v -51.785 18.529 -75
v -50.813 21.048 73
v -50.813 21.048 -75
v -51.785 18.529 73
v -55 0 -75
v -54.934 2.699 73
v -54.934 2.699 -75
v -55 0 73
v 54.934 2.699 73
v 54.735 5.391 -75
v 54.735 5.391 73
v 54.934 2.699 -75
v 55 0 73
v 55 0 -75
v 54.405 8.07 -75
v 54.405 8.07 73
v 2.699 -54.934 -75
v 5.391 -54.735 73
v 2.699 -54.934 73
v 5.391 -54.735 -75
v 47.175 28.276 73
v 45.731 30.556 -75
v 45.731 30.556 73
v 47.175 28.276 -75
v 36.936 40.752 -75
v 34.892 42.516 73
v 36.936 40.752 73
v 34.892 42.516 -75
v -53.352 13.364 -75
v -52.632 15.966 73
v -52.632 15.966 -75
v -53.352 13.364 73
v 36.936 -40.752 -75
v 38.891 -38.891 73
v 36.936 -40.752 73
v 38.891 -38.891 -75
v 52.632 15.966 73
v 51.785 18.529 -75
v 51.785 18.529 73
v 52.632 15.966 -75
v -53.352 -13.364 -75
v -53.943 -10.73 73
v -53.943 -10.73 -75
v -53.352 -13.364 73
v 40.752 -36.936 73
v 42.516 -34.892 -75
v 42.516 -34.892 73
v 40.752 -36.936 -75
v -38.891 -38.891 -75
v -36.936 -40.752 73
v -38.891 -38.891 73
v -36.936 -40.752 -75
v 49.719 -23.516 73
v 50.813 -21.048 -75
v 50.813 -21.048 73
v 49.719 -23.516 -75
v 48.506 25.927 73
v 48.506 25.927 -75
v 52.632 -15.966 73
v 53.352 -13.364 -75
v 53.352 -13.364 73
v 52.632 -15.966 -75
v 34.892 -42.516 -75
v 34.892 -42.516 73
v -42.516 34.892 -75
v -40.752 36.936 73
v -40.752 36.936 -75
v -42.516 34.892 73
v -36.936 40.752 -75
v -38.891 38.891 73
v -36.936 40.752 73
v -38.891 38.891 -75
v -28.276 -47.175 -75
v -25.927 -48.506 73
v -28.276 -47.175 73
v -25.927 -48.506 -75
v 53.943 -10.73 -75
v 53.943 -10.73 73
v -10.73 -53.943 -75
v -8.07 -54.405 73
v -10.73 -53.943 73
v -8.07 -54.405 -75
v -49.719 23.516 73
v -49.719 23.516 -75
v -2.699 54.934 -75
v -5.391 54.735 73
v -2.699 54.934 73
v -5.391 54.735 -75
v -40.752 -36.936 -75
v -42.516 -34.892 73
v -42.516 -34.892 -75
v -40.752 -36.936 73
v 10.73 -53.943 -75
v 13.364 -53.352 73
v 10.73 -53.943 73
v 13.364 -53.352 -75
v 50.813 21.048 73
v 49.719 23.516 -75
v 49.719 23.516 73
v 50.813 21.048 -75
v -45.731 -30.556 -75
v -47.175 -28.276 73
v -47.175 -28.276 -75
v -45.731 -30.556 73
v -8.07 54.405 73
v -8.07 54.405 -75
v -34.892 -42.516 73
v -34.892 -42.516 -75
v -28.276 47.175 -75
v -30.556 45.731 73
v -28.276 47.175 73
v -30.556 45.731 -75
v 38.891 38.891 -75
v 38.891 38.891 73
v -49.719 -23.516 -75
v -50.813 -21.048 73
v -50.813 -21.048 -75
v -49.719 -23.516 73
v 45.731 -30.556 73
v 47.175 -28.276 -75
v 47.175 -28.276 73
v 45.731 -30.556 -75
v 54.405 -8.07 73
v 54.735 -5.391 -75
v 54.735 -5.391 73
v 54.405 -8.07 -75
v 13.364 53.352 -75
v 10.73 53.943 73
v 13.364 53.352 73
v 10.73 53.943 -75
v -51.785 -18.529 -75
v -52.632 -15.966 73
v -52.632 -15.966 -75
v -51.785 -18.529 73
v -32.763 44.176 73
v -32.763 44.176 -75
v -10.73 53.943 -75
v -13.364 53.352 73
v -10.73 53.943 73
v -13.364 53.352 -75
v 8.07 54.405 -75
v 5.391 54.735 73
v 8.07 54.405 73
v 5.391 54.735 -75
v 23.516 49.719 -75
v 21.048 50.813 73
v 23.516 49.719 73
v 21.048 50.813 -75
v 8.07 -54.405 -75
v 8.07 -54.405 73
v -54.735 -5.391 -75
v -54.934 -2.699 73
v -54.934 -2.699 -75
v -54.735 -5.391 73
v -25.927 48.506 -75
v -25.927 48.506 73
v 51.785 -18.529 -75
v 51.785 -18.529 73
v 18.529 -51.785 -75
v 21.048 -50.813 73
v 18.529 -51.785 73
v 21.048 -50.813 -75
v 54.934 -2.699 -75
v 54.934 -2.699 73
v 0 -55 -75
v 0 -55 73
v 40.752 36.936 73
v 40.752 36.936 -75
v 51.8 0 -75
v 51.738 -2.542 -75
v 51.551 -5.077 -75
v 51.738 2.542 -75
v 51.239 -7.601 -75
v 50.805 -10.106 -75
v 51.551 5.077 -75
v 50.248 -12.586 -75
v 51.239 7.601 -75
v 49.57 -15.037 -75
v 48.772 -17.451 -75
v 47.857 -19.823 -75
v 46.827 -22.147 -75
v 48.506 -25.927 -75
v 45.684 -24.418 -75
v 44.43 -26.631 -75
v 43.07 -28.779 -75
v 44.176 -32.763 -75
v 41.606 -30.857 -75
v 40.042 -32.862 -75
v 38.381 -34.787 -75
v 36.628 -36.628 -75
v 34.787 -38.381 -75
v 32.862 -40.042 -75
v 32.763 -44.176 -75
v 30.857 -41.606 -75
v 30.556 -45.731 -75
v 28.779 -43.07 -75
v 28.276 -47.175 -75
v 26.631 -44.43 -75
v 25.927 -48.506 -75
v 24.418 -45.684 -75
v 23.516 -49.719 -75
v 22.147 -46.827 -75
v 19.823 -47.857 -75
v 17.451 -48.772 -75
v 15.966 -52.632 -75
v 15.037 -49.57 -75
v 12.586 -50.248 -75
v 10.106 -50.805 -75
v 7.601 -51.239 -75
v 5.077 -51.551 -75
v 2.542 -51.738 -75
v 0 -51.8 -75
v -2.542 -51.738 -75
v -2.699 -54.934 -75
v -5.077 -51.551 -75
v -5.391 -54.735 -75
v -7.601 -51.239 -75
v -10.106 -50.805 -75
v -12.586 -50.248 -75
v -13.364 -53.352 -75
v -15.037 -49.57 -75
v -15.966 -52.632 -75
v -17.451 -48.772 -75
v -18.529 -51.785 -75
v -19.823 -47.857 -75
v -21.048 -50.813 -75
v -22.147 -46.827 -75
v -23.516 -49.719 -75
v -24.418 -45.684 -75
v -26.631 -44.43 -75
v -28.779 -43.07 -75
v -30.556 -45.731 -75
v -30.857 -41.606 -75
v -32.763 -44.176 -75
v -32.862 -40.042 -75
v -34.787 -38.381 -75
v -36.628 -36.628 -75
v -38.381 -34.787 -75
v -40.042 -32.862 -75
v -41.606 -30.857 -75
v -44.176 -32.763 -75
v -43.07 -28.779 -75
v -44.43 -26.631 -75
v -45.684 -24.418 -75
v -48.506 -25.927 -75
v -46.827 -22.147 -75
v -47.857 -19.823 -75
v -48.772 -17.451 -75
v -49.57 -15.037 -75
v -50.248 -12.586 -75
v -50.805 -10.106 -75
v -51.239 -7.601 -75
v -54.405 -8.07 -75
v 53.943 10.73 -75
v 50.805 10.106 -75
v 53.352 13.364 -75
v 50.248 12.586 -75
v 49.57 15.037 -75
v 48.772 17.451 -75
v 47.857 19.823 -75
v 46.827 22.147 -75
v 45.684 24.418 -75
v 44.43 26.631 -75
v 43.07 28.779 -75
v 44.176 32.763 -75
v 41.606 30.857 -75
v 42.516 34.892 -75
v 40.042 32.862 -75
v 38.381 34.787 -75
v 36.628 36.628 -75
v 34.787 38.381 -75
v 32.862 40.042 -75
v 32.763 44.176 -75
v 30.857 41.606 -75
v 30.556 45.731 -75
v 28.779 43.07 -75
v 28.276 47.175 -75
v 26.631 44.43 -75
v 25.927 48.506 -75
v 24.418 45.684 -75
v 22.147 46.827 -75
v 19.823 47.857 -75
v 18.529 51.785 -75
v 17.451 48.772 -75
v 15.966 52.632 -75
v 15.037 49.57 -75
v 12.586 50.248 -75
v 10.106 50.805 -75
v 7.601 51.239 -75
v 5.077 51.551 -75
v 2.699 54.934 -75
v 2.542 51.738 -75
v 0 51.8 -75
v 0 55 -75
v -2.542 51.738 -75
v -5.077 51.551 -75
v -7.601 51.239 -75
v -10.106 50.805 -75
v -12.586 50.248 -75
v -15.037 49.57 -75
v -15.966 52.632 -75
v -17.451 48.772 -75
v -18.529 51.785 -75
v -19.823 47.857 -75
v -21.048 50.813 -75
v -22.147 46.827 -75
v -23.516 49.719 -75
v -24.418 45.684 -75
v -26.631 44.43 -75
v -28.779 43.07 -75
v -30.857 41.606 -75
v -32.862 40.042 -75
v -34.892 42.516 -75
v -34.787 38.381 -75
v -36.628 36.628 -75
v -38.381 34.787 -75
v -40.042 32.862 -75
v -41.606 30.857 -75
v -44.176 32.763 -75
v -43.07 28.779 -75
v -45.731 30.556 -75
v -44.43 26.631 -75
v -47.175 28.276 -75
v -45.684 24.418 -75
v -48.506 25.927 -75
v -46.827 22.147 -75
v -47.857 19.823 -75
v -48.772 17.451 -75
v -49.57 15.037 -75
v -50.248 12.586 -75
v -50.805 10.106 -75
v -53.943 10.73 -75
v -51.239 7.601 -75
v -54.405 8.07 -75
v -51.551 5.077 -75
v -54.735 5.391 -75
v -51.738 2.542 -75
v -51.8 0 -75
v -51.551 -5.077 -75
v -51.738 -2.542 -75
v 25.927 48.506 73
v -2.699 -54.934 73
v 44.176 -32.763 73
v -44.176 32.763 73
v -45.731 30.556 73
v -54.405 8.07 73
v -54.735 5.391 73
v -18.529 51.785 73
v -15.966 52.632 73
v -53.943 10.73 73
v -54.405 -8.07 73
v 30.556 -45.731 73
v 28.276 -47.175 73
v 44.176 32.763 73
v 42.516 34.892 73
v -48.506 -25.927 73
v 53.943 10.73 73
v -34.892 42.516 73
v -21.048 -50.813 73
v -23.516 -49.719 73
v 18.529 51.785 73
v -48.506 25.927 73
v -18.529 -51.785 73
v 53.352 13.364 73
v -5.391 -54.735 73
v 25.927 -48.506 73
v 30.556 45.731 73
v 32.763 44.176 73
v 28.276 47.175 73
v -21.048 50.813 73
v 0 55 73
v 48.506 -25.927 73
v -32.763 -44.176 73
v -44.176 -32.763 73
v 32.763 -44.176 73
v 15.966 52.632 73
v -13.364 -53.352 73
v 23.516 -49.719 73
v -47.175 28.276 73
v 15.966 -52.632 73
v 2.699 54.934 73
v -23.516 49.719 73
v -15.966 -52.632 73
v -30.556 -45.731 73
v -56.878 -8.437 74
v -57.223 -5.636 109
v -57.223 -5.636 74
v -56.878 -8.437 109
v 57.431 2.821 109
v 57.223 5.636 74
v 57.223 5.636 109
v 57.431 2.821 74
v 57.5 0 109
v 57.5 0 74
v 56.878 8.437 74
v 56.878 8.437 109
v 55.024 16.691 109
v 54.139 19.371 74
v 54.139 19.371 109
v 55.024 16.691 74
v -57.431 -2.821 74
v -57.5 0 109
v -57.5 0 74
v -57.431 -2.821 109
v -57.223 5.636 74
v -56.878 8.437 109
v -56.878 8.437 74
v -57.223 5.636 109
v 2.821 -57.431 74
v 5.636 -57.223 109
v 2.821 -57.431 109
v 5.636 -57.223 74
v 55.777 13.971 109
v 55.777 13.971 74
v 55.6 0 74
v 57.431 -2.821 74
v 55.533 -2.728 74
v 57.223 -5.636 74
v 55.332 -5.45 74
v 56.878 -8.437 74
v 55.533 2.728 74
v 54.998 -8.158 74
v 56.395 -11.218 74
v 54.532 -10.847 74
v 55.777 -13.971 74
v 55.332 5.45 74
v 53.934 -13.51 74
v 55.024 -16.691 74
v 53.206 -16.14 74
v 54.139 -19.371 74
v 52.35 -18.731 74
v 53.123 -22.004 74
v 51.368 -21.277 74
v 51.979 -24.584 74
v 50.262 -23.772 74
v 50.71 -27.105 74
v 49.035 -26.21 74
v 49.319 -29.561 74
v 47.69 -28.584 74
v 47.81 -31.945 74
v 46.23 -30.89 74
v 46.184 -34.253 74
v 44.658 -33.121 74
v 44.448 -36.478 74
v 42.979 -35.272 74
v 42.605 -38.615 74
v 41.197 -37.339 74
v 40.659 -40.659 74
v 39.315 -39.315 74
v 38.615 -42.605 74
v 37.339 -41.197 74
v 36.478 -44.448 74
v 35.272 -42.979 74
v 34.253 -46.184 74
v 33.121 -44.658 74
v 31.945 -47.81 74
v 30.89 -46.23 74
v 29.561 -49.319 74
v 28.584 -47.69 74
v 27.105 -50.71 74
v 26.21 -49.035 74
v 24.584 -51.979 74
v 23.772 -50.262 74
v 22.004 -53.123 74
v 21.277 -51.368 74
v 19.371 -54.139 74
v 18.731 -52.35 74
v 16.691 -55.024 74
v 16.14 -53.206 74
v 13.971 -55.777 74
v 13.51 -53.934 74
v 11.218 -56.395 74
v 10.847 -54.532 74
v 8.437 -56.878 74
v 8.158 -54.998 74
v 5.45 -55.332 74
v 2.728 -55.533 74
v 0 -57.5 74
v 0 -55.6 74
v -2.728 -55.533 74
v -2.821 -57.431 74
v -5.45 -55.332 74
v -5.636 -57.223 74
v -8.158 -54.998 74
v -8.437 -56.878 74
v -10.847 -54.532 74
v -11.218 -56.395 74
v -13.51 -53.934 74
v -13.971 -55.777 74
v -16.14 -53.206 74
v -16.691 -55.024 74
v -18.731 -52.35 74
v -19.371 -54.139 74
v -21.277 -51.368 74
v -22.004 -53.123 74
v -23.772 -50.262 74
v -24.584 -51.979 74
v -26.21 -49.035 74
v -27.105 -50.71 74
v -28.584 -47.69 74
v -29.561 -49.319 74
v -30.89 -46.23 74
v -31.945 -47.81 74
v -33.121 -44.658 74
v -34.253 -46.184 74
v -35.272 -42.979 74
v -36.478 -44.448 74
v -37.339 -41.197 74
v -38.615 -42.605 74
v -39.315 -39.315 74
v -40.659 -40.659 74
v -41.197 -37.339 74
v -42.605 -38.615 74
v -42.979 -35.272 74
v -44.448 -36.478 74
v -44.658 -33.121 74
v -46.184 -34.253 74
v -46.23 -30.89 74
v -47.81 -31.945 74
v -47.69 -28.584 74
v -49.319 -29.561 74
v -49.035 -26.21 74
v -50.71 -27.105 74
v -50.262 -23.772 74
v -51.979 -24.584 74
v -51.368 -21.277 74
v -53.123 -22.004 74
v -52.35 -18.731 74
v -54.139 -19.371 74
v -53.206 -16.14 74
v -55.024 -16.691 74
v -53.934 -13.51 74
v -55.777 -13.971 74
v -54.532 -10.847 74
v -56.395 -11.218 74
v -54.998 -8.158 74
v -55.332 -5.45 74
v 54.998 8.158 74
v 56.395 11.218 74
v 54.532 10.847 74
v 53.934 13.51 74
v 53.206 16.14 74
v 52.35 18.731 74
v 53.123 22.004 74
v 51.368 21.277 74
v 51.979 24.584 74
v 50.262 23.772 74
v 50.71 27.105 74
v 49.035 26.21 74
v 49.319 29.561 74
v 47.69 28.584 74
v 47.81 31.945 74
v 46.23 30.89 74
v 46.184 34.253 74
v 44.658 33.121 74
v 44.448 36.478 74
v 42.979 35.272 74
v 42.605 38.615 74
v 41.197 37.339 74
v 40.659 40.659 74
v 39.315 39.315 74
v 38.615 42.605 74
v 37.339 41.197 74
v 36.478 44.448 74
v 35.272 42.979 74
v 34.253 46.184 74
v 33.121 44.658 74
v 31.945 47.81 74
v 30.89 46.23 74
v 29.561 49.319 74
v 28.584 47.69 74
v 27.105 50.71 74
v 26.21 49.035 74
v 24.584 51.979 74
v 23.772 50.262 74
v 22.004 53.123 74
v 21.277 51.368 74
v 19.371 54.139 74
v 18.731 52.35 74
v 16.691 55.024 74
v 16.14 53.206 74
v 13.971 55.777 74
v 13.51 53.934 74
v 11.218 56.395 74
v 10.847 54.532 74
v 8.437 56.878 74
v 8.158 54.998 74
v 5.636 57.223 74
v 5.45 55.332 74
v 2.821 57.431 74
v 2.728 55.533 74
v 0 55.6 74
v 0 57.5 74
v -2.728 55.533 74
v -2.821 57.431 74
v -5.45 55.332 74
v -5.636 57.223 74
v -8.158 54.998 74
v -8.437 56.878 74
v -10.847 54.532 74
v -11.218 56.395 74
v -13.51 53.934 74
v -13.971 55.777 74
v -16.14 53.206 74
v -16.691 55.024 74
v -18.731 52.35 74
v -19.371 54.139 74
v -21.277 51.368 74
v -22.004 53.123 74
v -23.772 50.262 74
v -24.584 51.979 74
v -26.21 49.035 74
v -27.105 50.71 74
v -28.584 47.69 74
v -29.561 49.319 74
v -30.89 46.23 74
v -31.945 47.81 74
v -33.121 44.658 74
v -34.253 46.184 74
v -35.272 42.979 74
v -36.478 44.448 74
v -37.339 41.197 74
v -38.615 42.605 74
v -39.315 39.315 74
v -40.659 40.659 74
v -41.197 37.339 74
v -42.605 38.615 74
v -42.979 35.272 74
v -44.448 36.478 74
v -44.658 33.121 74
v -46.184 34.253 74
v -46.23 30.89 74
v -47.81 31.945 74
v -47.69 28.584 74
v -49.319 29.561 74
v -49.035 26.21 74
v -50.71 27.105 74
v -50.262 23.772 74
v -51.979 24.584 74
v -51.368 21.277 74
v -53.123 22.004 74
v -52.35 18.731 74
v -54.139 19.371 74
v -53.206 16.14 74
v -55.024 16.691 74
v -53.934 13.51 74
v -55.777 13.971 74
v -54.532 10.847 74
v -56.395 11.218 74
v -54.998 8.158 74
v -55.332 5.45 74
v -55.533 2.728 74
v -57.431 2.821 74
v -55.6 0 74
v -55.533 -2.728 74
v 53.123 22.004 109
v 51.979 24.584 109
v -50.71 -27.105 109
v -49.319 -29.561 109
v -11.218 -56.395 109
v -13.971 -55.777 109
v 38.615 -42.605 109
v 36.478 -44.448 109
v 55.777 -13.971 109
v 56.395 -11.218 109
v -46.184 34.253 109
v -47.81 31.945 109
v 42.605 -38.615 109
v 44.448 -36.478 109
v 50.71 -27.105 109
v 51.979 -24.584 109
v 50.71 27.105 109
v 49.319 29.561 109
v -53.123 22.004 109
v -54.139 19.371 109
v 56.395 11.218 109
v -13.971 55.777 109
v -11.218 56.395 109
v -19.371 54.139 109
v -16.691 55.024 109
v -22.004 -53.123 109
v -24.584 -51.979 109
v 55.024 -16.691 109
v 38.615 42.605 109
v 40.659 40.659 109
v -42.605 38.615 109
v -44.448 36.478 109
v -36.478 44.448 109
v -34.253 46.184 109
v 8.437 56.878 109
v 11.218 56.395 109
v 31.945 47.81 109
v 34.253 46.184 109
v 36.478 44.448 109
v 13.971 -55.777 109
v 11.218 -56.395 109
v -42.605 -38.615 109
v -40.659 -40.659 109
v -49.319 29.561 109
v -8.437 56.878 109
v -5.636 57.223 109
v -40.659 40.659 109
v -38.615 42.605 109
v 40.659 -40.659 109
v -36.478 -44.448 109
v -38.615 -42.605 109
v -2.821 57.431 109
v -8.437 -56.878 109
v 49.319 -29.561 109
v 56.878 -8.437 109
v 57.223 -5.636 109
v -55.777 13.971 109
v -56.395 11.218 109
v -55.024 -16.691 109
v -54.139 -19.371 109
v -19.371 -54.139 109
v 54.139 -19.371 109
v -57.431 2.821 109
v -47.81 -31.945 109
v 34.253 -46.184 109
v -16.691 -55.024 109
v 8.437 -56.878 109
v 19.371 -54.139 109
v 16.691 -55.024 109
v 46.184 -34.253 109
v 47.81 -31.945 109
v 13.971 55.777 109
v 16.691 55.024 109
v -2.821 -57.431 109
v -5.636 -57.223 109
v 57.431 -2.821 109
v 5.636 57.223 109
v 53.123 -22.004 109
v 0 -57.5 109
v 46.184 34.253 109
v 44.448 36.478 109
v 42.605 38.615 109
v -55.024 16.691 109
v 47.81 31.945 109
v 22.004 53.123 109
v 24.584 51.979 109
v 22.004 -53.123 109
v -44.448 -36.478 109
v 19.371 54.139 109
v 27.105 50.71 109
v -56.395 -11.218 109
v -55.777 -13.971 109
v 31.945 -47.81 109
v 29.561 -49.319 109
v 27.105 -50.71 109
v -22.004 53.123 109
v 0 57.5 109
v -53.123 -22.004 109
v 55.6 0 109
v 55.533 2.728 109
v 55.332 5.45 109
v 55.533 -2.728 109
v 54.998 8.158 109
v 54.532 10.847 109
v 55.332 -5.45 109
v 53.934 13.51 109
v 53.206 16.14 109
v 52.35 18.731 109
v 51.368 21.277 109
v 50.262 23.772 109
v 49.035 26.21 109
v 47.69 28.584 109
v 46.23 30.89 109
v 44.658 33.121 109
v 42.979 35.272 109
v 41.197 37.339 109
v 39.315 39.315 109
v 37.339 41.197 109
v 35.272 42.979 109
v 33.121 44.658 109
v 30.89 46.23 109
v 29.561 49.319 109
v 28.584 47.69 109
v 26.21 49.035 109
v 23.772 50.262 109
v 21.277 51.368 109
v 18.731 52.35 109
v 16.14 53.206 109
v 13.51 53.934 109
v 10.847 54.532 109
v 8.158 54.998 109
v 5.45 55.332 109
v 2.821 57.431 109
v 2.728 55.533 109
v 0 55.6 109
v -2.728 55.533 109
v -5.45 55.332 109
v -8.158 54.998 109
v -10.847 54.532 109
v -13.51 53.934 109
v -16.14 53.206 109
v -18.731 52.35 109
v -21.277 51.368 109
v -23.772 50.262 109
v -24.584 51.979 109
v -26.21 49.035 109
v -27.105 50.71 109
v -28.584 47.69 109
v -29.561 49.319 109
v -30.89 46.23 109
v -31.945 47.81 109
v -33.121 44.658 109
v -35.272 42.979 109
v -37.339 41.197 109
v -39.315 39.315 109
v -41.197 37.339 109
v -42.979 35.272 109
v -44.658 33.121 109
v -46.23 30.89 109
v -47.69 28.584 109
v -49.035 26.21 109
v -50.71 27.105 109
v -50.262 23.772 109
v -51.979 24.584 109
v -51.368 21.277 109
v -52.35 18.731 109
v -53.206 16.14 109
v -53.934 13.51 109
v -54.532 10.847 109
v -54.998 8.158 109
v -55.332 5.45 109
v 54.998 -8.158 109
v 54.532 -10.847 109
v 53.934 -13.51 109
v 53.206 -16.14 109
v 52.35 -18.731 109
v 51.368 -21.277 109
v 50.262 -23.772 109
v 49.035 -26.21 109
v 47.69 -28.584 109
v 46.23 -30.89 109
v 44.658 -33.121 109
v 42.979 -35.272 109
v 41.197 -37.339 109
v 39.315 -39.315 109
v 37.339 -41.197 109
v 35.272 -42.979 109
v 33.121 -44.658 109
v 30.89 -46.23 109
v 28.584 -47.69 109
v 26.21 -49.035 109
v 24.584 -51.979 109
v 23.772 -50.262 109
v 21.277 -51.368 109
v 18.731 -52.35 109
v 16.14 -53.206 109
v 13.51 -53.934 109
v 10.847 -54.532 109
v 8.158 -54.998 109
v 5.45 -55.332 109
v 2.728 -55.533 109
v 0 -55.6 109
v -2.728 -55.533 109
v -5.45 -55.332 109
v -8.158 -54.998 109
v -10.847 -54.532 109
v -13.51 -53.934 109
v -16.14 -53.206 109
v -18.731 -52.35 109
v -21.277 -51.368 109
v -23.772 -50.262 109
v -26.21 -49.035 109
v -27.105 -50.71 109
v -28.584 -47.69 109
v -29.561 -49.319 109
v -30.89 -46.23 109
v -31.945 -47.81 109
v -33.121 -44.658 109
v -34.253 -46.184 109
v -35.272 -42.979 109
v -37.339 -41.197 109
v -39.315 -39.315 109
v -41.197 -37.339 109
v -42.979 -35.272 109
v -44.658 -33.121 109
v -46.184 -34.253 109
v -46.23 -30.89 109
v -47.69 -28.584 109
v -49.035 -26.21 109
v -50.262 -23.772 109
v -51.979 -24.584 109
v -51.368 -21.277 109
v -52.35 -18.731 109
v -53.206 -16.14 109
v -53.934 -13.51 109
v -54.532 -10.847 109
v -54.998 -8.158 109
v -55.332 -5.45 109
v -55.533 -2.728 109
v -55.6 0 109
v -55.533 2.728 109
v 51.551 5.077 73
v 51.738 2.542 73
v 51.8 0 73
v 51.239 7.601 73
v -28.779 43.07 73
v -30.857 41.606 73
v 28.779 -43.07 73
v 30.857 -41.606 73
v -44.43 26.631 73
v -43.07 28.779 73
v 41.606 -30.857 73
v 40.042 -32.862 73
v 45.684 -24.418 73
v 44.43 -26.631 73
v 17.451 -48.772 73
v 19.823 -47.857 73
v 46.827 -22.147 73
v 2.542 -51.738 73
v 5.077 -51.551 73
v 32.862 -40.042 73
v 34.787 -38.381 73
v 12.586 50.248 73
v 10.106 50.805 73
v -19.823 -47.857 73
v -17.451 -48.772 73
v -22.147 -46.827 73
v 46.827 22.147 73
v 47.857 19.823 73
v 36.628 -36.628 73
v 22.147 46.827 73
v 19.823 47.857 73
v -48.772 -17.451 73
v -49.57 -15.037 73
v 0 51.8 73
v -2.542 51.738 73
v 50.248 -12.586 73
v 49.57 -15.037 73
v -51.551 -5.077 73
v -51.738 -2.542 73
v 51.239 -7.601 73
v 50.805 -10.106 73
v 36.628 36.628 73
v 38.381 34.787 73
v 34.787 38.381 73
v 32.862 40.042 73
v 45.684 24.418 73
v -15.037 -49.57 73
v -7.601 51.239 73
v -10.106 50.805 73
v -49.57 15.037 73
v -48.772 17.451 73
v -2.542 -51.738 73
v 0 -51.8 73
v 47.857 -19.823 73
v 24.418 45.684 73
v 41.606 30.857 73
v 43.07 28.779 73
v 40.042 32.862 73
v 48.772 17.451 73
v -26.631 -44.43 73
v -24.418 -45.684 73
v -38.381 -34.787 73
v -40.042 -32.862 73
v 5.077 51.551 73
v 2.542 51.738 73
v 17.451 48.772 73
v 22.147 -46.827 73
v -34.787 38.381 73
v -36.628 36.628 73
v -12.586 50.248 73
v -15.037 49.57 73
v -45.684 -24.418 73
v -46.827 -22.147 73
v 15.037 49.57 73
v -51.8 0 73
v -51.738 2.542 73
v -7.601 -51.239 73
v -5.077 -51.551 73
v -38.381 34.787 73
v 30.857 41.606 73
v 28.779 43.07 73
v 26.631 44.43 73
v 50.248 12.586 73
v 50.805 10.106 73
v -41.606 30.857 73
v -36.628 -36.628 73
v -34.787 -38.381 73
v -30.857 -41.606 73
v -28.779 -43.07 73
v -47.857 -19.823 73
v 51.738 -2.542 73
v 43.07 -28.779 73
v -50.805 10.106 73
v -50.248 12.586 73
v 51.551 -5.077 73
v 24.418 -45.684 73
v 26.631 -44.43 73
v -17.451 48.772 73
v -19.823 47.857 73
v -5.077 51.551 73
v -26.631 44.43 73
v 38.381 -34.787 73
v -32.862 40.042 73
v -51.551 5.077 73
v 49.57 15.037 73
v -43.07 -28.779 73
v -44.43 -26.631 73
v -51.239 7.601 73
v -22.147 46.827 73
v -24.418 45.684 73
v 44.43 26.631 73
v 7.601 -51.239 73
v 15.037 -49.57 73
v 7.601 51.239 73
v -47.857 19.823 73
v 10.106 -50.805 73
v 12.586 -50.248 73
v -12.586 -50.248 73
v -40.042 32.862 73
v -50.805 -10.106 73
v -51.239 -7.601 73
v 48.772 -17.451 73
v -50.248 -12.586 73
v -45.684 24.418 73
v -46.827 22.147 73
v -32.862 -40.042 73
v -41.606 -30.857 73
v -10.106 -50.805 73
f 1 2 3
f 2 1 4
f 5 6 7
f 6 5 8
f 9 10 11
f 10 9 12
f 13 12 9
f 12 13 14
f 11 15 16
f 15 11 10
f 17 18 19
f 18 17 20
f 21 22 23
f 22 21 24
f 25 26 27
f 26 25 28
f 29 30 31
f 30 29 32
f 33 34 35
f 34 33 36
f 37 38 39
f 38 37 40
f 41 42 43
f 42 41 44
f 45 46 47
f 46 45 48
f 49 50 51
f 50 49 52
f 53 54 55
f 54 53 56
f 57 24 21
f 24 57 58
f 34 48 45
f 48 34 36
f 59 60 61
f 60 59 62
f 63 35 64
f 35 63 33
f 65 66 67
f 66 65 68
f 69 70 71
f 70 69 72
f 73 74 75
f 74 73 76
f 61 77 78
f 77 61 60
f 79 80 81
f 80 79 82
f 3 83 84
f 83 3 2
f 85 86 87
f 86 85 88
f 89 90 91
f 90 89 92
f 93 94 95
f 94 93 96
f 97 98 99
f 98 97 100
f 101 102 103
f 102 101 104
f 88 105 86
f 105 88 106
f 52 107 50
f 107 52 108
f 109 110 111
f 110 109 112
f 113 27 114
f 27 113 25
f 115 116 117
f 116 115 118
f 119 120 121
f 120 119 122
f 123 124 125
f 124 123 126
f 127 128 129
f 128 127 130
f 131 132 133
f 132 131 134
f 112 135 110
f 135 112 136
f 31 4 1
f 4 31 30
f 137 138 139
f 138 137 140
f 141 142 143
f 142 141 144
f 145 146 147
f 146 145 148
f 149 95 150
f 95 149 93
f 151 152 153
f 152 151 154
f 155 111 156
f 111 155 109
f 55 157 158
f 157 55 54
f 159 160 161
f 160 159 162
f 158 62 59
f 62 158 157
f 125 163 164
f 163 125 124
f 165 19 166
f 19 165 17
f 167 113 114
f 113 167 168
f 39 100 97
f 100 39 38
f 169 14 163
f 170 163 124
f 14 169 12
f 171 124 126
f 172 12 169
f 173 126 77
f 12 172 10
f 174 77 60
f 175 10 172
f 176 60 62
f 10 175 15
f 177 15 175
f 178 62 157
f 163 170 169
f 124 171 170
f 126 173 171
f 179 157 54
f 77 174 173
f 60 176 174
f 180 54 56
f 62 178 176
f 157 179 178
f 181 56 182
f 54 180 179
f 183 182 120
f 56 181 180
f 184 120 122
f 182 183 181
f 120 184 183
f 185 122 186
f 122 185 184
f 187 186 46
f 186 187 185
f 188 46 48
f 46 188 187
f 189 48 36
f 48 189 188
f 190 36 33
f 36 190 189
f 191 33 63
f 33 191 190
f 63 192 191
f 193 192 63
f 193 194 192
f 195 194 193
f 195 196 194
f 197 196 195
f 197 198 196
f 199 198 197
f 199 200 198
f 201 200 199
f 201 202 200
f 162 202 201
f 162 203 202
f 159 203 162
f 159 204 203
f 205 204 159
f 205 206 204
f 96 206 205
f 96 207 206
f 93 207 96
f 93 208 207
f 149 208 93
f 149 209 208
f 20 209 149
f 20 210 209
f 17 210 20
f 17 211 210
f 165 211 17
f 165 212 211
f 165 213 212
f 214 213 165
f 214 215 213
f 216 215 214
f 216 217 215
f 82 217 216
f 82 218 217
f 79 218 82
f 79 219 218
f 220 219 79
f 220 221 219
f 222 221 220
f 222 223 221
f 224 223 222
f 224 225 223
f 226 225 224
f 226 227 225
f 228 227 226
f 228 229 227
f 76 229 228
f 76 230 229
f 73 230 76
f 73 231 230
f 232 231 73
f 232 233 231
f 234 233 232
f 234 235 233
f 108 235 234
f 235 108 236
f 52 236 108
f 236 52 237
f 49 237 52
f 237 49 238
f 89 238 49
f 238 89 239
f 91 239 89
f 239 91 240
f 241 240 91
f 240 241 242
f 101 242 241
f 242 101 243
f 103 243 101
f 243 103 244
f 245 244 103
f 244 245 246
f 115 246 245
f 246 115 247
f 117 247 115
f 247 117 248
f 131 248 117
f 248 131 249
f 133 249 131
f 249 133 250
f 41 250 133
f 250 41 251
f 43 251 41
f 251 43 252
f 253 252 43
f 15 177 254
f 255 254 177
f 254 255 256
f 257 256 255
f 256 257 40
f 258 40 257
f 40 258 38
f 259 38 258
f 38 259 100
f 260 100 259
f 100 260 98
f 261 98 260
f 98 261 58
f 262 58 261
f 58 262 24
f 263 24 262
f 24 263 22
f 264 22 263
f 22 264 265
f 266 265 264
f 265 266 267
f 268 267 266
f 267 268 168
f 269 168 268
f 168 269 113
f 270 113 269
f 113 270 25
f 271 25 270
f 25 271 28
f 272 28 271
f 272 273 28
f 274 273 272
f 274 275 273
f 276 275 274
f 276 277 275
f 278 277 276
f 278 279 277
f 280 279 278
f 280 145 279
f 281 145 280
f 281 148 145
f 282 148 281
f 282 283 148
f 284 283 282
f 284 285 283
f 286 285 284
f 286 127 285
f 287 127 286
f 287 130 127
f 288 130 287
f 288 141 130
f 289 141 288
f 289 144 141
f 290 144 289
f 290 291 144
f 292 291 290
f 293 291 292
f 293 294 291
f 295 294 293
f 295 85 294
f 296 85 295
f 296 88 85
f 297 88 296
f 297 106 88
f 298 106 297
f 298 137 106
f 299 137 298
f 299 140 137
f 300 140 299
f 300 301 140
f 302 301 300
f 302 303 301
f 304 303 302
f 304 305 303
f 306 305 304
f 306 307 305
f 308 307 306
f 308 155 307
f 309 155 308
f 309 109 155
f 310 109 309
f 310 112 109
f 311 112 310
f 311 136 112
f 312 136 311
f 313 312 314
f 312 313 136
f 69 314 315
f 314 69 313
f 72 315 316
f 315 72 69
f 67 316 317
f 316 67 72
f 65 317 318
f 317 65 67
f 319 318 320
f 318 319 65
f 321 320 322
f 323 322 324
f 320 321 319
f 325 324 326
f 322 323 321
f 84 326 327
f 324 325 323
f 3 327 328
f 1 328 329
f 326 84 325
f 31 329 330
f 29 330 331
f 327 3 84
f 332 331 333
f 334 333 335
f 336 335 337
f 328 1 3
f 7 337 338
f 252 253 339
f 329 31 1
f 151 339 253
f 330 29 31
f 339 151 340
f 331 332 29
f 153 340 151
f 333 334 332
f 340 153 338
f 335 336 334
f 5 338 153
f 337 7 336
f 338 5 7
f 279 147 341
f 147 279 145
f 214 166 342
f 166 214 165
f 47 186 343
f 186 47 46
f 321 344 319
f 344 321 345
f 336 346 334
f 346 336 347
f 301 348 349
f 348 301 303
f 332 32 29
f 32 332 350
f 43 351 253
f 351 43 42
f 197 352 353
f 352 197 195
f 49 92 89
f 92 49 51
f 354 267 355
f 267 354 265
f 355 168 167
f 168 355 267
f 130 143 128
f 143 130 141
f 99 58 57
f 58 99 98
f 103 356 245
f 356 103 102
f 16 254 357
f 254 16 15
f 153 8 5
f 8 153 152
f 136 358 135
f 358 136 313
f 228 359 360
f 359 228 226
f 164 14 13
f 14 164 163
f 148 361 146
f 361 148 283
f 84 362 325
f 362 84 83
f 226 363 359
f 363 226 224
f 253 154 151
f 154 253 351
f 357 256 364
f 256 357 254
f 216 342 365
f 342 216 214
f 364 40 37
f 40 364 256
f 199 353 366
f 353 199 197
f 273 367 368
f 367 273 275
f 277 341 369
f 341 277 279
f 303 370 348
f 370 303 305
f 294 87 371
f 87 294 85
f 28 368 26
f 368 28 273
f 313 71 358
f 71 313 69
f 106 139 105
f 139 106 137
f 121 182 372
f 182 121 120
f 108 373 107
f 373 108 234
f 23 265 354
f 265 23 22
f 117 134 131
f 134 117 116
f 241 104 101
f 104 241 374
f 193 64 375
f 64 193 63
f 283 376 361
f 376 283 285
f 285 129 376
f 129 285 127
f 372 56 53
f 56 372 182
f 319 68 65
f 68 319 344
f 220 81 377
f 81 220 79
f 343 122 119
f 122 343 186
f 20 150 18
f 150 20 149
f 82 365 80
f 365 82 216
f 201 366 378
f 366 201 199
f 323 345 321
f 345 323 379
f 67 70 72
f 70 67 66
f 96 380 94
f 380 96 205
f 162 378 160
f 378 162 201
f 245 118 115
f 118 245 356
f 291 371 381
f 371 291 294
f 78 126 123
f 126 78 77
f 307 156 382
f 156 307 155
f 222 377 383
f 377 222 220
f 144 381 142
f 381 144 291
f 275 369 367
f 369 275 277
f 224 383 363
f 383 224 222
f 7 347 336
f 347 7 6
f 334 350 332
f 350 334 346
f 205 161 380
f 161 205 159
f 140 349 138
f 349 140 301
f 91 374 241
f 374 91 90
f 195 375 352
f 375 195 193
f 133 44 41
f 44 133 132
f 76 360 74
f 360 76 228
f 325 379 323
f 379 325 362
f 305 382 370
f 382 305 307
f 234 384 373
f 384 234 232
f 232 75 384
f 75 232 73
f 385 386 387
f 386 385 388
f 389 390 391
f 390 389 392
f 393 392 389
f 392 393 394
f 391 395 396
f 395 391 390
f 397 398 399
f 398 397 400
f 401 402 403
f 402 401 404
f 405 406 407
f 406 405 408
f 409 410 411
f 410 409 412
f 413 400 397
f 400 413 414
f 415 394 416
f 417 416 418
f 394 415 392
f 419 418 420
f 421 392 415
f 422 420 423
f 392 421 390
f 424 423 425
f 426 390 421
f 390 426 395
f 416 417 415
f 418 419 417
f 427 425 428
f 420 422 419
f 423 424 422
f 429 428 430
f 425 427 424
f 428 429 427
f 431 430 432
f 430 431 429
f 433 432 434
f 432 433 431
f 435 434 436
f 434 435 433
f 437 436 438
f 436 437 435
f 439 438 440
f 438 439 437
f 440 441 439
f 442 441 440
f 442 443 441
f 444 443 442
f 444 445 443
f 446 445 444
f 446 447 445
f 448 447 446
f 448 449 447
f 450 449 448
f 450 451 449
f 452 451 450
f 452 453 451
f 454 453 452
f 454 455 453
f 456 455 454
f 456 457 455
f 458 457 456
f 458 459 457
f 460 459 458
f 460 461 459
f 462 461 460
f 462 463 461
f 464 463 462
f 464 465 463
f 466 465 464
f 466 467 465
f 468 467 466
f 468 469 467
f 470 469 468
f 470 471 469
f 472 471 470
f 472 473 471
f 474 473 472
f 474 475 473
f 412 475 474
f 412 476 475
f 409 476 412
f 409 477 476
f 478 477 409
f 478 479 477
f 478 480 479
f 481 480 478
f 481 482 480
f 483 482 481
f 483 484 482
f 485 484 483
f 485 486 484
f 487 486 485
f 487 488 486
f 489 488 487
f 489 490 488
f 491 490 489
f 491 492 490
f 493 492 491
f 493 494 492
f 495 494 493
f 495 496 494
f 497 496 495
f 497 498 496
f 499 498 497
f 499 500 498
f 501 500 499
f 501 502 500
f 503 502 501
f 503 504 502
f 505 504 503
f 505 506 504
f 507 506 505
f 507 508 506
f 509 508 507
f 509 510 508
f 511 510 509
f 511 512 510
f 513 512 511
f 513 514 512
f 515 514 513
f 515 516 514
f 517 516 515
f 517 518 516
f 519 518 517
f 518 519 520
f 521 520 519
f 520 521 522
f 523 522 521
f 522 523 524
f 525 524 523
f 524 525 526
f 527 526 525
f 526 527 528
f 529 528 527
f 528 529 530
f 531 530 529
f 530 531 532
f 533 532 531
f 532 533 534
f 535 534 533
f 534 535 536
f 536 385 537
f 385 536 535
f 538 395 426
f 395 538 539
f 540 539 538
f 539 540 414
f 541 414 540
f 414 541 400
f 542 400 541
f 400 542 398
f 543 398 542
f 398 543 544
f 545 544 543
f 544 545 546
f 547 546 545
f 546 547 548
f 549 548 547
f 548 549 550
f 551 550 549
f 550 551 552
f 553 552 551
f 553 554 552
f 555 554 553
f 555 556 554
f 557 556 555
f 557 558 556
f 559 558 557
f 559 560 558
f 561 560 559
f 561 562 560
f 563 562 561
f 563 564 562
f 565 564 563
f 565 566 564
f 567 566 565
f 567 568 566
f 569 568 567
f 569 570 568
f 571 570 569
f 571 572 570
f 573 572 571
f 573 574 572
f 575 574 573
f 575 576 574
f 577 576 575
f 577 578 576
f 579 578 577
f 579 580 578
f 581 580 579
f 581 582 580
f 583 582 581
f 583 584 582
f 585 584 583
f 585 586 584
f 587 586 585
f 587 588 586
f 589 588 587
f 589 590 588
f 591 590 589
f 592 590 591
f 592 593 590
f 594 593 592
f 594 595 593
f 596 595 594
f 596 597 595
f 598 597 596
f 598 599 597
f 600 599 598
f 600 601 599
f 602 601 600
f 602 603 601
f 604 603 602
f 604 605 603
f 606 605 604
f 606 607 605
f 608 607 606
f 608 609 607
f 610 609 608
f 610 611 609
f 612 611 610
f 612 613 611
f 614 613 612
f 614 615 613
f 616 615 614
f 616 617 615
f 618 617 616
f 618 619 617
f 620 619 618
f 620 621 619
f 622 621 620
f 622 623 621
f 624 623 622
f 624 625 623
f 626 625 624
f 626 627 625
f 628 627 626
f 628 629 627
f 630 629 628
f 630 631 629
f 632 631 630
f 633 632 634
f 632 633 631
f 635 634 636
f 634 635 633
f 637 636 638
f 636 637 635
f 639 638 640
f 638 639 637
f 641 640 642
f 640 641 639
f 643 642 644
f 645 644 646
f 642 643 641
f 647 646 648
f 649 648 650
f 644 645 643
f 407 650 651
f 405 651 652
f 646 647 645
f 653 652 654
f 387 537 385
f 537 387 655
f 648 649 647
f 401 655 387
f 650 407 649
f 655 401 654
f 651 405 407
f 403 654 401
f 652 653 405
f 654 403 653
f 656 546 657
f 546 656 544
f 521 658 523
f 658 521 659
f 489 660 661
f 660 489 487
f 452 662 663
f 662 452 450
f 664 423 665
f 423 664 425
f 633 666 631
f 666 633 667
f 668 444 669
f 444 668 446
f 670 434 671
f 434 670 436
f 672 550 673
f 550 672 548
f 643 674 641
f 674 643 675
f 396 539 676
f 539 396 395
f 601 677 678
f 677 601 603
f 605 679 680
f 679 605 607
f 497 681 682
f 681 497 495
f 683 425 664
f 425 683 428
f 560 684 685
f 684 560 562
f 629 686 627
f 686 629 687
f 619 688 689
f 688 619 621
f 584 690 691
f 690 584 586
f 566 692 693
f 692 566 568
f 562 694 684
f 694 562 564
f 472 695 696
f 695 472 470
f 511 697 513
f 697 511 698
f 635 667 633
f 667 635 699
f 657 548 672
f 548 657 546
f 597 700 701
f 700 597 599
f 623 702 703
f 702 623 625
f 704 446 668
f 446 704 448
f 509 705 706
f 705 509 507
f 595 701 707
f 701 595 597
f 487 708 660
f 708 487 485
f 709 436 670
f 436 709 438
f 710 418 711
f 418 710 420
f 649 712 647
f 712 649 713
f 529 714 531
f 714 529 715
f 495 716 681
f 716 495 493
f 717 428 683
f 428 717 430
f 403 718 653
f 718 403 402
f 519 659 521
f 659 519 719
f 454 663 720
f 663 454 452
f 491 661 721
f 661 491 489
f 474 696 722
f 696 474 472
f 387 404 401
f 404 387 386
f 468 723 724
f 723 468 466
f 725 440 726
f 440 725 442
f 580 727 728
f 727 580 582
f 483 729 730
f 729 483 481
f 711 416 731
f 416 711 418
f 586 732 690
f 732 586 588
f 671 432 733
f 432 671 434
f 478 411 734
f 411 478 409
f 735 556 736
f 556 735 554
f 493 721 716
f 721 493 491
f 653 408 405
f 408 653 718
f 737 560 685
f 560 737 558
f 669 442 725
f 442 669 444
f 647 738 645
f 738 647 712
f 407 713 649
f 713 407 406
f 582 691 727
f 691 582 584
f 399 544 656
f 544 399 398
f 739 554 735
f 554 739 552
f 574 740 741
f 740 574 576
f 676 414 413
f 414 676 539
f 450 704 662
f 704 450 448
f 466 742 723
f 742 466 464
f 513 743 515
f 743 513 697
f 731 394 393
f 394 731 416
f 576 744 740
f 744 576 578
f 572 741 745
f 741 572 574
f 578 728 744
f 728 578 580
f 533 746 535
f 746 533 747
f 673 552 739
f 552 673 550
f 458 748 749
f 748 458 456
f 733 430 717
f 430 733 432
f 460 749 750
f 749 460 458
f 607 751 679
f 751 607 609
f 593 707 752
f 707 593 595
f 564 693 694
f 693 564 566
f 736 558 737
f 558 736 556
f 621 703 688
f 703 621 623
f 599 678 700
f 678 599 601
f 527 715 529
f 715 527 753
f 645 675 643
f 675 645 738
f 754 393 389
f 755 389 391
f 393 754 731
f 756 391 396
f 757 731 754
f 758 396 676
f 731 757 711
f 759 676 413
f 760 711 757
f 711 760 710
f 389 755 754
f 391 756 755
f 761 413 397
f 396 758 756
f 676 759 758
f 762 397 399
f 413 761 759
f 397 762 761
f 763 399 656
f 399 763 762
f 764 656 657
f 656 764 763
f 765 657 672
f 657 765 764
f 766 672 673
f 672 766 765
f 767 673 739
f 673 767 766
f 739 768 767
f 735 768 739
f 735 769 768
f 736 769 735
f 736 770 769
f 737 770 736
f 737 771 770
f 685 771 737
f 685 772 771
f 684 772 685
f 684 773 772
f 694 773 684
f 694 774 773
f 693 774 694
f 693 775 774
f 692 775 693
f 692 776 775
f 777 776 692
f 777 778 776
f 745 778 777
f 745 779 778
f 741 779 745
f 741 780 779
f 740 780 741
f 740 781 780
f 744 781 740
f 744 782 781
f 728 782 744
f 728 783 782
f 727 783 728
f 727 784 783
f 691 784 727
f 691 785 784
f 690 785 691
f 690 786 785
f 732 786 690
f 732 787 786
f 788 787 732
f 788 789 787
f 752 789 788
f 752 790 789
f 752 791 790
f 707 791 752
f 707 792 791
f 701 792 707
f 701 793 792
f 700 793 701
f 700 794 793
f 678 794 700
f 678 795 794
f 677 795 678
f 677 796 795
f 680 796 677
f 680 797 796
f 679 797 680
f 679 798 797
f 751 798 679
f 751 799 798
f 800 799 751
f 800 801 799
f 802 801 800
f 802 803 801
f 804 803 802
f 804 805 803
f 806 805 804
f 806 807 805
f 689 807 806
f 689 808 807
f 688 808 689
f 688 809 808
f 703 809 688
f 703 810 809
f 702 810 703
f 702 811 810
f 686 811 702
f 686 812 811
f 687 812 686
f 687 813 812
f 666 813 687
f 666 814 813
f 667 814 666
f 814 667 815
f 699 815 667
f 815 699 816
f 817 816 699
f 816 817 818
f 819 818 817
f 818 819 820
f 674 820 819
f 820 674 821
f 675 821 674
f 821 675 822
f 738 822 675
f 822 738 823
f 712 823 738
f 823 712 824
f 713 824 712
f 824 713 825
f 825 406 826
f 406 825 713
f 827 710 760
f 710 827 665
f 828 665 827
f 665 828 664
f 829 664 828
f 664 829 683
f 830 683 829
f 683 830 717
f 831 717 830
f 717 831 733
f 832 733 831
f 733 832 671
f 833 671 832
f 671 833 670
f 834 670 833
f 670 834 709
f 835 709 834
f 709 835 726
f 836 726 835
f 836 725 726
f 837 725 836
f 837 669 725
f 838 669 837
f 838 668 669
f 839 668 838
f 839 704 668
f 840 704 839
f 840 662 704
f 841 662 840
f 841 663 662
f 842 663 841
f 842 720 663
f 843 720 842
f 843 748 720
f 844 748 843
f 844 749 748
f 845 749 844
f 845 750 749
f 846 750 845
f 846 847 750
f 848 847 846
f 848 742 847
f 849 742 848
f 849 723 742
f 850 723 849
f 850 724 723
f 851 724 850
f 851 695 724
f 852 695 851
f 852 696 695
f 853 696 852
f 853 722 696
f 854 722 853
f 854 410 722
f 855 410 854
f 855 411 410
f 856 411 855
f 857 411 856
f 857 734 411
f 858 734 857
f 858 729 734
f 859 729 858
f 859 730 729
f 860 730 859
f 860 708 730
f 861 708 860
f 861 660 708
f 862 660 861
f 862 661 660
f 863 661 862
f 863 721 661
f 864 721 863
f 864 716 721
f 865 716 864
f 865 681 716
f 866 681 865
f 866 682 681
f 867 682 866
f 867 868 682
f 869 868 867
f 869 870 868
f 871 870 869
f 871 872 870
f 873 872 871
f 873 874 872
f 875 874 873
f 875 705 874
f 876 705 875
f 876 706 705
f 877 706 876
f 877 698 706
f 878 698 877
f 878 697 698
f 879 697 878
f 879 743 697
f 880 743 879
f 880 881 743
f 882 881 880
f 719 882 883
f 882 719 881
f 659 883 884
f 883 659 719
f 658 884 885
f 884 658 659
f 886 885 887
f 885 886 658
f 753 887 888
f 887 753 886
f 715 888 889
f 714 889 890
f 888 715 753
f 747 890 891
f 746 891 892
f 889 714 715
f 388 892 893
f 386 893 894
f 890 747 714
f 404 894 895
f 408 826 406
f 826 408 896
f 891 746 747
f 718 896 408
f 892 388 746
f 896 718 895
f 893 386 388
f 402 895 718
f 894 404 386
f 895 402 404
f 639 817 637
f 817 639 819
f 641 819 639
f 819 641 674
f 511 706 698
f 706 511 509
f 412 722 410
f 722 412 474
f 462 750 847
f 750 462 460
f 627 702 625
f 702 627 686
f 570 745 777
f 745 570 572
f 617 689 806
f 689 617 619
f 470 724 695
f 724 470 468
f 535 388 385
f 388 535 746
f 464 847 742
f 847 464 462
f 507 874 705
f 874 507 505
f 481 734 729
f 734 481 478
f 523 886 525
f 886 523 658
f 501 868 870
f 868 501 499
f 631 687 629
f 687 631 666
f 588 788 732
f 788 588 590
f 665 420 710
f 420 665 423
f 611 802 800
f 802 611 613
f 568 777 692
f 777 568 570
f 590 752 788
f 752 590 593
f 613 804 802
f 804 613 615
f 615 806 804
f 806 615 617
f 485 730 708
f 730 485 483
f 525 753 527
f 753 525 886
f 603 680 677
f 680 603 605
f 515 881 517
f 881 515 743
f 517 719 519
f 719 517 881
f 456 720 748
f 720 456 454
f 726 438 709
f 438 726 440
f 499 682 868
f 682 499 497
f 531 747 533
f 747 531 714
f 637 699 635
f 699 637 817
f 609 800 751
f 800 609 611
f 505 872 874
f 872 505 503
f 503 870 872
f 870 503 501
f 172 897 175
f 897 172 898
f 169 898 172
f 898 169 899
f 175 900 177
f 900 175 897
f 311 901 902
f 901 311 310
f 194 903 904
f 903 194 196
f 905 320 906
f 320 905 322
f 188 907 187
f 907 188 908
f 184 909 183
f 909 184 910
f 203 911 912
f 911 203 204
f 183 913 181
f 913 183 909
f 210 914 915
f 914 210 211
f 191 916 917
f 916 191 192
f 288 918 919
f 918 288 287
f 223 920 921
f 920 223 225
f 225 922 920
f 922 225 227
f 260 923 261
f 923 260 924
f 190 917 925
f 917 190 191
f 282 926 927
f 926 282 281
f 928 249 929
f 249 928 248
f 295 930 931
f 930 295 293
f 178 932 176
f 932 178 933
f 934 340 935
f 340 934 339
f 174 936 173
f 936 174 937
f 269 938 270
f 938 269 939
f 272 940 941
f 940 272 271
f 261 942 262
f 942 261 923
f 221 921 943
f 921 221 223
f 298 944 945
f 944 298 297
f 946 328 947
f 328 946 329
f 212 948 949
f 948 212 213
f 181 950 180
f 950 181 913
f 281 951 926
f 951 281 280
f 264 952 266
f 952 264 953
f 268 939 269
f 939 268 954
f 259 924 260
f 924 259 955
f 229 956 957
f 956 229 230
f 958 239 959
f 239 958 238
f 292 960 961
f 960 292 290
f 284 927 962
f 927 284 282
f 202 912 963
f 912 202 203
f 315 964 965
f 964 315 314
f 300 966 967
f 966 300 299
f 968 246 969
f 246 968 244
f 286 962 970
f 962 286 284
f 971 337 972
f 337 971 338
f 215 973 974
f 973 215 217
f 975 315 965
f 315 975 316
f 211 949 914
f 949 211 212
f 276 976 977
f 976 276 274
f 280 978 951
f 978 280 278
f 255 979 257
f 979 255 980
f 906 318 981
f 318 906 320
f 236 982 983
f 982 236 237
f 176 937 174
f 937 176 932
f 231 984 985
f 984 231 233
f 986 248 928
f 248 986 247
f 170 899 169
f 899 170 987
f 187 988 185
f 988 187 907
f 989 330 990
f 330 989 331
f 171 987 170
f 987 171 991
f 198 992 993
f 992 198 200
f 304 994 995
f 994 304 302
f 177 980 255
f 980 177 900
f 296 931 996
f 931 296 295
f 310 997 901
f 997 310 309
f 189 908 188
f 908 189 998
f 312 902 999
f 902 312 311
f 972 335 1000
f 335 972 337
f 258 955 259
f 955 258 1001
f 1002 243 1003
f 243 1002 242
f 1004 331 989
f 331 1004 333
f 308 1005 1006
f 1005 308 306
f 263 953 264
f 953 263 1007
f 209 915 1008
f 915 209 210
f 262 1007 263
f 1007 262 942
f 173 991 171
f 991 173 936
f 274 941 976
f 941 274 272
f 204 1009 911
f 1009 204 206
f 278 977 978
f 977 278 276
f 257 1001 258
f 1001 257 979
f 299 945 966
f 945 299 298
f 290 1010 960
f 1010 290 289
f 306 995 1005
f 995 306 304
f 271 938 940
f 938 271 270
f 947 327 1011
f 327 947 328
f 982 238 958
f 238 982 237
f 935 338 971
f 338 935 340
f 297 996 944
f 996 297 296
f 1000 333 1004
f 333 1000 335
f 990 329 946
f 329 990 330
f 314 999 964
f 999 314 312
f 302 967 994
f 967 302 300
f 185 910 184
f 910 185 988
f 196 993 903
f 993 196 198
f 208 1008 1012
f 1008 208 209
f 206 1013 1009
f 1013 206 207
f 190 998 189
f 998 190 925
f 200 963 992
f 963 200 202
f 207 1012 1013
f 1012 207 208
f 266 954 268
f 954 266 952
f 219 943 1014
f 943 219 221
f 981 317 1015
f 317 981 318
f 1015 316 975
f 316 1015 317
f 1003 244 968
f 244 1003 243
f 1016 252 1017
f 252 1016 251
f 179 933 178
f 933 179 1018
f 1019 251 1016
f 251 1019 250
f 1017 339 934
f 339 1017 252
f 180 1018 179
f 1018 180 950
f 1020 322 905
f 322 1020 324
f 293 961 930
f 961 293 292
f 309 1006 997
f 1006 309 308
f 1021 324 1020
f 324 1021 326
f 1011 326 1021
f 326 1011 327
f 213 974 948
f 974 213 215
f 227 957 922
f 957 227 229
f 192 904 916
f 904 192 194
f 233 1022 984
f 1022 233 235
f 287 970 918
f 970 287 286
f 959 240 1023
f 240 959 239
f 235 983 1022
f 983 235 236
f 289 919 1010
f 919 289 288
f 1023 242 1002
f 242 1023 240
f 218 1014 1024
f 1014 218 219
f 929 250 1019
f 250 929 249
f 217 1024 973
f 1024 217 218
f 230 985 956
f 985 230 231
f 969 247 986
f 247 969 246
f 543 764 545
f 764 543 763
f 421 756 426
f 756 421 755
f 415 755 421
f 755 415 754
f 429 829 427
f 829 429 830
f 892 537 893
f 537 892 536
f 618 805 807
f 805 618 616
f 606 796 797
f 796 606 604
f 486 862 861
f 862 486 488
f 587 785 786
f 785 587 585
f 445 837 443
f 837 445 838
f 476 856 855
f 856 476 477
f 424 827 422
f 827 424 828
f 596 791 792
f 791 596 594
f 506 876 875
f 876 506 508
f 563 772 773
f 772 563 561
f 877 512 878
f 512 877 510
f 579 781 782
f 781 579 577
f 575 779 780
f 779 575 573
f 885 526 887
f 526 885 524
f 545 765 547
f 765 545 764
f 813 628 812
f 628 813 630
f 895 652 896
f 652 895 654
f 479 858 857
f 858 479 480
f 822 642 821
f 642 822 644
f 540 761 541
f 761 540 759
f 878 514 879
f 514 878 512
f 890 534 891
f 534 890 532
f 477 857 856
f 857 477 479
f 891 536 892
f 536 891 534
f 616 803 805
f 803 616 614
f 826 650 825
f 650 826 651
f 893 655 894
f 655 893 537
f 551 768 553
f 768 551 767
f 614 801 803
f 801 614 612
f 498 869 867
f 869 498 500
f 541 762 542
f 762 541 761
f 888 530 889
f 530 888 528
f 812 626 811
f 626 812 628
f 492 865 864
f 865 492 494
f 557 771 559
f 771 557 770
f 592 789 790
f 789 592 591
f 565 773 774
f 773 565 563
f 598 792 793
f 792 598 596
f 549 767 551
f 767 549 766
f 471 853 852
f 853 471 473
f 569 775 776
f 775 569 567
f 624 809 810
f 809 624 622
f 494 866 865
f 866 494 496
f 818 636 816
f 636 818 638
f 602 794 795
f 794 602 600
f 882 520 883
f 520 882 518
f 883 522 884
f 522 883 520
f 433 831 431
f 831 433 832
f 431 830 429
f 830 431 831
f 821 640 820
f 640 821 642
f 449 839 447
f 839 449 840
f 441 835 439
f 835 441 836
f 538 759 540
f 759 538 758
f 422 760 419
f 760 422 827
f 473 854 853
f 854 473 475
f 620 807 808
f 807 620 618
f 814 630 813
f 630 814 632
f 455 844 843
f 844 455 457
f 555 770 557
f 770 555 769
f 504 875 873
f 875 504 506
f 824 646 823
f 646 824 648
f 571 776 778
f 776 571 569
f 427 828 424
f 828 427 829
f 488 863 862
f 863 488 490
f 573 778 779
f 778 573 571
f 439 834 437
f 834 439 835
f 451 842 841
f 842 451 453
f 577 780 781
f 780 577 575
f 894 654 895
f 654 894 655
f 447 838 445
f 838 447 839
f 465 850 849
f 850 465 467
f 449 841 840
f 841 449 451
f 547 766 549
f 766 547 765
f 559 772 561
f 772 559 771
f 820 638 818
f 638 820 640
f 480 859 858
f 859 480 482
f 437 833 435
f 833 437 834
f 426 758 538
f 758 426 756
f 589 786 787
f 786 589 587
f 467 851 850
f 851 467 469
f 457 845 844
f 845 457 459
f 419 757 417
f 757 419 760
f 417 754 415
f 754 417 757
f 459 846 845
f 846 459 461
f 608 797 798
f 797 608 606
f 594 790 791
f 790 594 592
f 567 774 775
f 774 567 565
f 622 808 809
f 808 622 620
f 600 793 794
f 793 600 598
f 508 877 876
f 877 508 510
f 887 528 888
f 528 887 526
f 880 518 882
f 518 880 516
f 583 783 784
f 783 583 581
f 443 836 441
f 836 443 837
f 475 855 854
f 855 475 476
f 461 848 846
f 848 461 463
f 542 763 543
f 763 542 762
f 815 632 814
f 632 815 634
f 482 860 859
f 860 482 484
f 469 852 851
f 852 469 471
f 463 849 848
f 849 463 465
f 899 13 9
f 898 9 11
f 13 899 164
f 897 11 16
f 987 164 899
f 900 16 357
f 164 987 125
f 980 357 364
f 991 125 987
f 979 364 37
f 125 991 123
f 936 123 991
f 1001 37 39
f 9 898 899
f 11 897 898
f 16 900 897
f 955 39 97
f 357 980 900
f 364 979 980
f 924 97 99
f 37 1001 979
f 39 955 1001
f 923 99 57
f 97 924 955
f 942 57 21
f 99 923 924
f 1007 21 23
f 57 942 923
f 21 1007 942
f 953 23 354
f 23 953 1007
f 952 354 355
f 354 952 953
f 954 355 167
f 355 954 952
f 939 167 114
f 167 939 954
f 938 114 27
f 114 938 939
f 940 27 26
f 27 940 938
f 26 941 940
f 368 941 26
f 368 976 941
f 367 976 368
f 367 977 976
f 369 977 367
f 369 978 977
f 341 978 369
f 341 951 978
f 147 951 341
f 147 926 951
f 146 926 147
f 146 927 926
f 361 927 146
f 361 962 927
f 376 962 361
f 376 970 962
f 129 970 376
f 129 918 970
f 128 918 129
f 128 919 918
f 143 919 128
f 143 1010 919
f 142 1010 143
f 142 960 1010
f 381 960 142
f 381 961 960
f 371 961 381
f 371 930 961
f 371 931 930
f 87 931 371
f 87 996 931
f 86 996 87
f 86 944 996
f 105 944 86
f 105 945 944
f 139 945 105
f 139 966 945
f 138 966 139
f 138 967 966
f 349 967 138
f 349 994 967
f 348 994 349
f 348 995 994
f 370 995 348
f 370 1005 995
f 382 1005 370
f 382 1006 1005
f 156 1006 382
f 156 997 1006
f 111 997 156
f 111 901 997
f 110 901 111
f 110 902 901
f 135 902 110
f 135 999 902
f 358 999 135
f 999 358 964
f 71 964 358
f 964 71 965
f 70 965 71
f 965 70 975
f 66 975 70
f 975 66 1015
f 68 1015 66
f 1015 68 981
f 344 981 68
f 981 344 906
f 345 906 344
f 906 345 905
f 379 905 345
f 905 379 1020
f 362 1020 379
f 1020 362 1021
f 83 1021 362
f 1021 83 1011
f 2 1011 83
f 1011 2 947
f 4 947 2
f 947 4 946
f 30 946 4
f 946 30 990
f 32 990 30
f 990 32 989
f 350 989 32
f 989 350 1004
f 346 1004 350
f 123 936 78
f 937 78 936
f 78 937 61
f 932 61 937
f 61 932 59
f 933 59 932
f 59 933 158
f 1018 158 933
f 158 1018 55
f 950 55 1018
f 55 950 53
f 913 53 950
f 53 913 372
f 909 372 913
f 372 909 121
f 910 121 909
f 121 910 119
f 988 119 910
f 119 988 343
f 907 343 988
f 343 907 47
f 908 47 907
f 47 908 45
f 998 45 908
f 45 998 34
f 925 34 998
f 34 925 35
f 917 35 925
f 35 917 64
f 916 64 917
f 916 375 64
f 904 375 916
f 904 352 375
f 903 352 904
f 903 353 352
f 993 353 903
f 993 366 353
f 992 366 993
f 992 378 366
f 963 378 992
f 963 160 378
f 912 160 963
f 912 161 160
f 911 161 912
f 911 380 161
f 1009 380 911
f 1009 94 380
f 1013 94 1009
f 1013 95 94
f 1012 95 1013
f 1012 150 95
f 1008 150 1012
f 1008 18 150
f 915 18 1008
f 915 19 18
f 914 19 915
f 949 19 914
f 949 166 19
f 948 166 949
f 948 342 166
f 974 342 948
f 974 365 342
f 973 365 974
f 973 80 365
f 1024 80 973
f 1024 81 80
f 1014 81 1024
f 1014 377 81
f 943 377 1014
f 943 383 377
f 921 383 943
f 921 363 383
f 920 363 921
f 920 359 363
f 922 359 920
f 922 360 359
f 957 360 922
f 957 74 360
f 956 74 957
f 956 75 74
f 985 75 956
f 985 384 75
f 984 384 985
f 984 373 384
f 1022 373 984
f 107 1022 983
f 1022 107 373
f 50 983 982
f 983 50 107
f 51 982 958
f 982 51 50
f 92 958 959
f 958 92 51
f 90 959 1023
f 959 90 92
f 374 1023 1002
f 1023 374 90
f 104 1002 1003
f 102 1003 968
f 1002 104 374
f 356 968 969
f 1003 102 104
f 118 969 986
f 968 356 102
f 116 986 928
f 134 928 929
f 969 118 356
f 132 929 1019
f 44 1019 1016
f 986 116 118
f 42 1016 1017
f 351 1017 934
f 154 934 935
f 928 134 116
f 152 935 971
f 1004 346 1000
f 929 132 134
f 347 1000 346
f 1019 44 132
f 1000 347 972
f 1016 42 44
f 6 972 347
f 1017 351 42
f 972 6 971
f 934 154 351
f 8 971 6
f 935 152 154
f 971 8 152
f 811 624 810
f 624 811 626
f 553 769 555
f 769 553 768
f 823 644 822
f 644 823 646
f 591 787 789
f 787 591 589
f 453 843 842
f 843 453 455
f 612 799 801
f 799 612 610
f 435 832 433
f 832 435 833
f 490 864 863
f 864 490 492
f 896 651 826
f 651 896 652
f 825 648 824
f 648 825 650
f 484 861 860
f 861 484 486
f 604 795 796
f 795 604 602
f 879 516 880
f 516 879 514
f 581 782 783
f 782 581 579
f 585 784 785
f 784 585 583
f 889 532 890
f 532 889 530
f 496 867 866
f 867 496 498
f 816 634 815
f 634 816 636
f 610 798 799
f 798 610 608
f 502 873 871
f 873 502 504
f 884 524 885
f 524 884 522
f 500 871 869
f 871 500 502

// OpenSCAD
$fn = 128;

// Parameters
pipe_standard = 1; //[1:1:1]
nominal_diameter_mm = 110; //[55:220:1]
length_mm = 150; //[75:300:1]
outer_diameter_mm = 110; //[55:220:1]
wall_thickness_mm = 3.2; //[1.6:6.4:0.1]
include_end_fitting = 1; //[0:1:1]
fitting_length_mm = 35; //[18:70:1]
fitting_wall_extra_mm = 2.5; //[1.0:6.0:0.1]
fitting_inner_clearance_mm = 0.6; //[0.2:1.5:0.1]
overlap_mm = 1; //[0.5:2:0.1]

// Derived radii
pipe_r_o = outer_diameter_mm/2;
pipe_r_i = pipe_r_o - wall_thickness_mm;

fitting_r_o = pipe_r_o + fitting_wall_extra_mm;
fitting_r_i = pipe_r_o + fitting_inner_clearance_mm;

// Placement (centered model, fitting on +Z end)
fitting_z = (length_mm/2) + (fitting_length_mm/2) - overlap_mm;

module ht_pipe() {
  color([0.85, 0.85, 0.8])
  difference() {
    // OUTER: one connected solid (overlapped union)
    union() {
      cylinder(h=length_mm, r=pipe_r_o, center=true);

      if (include_end_fitting)
        translate([0, 0, fitting_z])
          cylinder(h=fitting_length_mm, r=fitting_r_o, center=true);
    }

    // INNER: subtract bores (extended to avoid coplanar artifacts)
    union() {
      cylinder(h=length_mm + 2*overlap_mm, r=pipe_r_i, center=true);

      if (include_end_fitting)
        translate([0, 0, fitting_z])
          cylinder(h=fitting_length_mm + 2*overlap_mm, r=fitting_r_i, center=true);
    }
  }
}

ht_pipe();
